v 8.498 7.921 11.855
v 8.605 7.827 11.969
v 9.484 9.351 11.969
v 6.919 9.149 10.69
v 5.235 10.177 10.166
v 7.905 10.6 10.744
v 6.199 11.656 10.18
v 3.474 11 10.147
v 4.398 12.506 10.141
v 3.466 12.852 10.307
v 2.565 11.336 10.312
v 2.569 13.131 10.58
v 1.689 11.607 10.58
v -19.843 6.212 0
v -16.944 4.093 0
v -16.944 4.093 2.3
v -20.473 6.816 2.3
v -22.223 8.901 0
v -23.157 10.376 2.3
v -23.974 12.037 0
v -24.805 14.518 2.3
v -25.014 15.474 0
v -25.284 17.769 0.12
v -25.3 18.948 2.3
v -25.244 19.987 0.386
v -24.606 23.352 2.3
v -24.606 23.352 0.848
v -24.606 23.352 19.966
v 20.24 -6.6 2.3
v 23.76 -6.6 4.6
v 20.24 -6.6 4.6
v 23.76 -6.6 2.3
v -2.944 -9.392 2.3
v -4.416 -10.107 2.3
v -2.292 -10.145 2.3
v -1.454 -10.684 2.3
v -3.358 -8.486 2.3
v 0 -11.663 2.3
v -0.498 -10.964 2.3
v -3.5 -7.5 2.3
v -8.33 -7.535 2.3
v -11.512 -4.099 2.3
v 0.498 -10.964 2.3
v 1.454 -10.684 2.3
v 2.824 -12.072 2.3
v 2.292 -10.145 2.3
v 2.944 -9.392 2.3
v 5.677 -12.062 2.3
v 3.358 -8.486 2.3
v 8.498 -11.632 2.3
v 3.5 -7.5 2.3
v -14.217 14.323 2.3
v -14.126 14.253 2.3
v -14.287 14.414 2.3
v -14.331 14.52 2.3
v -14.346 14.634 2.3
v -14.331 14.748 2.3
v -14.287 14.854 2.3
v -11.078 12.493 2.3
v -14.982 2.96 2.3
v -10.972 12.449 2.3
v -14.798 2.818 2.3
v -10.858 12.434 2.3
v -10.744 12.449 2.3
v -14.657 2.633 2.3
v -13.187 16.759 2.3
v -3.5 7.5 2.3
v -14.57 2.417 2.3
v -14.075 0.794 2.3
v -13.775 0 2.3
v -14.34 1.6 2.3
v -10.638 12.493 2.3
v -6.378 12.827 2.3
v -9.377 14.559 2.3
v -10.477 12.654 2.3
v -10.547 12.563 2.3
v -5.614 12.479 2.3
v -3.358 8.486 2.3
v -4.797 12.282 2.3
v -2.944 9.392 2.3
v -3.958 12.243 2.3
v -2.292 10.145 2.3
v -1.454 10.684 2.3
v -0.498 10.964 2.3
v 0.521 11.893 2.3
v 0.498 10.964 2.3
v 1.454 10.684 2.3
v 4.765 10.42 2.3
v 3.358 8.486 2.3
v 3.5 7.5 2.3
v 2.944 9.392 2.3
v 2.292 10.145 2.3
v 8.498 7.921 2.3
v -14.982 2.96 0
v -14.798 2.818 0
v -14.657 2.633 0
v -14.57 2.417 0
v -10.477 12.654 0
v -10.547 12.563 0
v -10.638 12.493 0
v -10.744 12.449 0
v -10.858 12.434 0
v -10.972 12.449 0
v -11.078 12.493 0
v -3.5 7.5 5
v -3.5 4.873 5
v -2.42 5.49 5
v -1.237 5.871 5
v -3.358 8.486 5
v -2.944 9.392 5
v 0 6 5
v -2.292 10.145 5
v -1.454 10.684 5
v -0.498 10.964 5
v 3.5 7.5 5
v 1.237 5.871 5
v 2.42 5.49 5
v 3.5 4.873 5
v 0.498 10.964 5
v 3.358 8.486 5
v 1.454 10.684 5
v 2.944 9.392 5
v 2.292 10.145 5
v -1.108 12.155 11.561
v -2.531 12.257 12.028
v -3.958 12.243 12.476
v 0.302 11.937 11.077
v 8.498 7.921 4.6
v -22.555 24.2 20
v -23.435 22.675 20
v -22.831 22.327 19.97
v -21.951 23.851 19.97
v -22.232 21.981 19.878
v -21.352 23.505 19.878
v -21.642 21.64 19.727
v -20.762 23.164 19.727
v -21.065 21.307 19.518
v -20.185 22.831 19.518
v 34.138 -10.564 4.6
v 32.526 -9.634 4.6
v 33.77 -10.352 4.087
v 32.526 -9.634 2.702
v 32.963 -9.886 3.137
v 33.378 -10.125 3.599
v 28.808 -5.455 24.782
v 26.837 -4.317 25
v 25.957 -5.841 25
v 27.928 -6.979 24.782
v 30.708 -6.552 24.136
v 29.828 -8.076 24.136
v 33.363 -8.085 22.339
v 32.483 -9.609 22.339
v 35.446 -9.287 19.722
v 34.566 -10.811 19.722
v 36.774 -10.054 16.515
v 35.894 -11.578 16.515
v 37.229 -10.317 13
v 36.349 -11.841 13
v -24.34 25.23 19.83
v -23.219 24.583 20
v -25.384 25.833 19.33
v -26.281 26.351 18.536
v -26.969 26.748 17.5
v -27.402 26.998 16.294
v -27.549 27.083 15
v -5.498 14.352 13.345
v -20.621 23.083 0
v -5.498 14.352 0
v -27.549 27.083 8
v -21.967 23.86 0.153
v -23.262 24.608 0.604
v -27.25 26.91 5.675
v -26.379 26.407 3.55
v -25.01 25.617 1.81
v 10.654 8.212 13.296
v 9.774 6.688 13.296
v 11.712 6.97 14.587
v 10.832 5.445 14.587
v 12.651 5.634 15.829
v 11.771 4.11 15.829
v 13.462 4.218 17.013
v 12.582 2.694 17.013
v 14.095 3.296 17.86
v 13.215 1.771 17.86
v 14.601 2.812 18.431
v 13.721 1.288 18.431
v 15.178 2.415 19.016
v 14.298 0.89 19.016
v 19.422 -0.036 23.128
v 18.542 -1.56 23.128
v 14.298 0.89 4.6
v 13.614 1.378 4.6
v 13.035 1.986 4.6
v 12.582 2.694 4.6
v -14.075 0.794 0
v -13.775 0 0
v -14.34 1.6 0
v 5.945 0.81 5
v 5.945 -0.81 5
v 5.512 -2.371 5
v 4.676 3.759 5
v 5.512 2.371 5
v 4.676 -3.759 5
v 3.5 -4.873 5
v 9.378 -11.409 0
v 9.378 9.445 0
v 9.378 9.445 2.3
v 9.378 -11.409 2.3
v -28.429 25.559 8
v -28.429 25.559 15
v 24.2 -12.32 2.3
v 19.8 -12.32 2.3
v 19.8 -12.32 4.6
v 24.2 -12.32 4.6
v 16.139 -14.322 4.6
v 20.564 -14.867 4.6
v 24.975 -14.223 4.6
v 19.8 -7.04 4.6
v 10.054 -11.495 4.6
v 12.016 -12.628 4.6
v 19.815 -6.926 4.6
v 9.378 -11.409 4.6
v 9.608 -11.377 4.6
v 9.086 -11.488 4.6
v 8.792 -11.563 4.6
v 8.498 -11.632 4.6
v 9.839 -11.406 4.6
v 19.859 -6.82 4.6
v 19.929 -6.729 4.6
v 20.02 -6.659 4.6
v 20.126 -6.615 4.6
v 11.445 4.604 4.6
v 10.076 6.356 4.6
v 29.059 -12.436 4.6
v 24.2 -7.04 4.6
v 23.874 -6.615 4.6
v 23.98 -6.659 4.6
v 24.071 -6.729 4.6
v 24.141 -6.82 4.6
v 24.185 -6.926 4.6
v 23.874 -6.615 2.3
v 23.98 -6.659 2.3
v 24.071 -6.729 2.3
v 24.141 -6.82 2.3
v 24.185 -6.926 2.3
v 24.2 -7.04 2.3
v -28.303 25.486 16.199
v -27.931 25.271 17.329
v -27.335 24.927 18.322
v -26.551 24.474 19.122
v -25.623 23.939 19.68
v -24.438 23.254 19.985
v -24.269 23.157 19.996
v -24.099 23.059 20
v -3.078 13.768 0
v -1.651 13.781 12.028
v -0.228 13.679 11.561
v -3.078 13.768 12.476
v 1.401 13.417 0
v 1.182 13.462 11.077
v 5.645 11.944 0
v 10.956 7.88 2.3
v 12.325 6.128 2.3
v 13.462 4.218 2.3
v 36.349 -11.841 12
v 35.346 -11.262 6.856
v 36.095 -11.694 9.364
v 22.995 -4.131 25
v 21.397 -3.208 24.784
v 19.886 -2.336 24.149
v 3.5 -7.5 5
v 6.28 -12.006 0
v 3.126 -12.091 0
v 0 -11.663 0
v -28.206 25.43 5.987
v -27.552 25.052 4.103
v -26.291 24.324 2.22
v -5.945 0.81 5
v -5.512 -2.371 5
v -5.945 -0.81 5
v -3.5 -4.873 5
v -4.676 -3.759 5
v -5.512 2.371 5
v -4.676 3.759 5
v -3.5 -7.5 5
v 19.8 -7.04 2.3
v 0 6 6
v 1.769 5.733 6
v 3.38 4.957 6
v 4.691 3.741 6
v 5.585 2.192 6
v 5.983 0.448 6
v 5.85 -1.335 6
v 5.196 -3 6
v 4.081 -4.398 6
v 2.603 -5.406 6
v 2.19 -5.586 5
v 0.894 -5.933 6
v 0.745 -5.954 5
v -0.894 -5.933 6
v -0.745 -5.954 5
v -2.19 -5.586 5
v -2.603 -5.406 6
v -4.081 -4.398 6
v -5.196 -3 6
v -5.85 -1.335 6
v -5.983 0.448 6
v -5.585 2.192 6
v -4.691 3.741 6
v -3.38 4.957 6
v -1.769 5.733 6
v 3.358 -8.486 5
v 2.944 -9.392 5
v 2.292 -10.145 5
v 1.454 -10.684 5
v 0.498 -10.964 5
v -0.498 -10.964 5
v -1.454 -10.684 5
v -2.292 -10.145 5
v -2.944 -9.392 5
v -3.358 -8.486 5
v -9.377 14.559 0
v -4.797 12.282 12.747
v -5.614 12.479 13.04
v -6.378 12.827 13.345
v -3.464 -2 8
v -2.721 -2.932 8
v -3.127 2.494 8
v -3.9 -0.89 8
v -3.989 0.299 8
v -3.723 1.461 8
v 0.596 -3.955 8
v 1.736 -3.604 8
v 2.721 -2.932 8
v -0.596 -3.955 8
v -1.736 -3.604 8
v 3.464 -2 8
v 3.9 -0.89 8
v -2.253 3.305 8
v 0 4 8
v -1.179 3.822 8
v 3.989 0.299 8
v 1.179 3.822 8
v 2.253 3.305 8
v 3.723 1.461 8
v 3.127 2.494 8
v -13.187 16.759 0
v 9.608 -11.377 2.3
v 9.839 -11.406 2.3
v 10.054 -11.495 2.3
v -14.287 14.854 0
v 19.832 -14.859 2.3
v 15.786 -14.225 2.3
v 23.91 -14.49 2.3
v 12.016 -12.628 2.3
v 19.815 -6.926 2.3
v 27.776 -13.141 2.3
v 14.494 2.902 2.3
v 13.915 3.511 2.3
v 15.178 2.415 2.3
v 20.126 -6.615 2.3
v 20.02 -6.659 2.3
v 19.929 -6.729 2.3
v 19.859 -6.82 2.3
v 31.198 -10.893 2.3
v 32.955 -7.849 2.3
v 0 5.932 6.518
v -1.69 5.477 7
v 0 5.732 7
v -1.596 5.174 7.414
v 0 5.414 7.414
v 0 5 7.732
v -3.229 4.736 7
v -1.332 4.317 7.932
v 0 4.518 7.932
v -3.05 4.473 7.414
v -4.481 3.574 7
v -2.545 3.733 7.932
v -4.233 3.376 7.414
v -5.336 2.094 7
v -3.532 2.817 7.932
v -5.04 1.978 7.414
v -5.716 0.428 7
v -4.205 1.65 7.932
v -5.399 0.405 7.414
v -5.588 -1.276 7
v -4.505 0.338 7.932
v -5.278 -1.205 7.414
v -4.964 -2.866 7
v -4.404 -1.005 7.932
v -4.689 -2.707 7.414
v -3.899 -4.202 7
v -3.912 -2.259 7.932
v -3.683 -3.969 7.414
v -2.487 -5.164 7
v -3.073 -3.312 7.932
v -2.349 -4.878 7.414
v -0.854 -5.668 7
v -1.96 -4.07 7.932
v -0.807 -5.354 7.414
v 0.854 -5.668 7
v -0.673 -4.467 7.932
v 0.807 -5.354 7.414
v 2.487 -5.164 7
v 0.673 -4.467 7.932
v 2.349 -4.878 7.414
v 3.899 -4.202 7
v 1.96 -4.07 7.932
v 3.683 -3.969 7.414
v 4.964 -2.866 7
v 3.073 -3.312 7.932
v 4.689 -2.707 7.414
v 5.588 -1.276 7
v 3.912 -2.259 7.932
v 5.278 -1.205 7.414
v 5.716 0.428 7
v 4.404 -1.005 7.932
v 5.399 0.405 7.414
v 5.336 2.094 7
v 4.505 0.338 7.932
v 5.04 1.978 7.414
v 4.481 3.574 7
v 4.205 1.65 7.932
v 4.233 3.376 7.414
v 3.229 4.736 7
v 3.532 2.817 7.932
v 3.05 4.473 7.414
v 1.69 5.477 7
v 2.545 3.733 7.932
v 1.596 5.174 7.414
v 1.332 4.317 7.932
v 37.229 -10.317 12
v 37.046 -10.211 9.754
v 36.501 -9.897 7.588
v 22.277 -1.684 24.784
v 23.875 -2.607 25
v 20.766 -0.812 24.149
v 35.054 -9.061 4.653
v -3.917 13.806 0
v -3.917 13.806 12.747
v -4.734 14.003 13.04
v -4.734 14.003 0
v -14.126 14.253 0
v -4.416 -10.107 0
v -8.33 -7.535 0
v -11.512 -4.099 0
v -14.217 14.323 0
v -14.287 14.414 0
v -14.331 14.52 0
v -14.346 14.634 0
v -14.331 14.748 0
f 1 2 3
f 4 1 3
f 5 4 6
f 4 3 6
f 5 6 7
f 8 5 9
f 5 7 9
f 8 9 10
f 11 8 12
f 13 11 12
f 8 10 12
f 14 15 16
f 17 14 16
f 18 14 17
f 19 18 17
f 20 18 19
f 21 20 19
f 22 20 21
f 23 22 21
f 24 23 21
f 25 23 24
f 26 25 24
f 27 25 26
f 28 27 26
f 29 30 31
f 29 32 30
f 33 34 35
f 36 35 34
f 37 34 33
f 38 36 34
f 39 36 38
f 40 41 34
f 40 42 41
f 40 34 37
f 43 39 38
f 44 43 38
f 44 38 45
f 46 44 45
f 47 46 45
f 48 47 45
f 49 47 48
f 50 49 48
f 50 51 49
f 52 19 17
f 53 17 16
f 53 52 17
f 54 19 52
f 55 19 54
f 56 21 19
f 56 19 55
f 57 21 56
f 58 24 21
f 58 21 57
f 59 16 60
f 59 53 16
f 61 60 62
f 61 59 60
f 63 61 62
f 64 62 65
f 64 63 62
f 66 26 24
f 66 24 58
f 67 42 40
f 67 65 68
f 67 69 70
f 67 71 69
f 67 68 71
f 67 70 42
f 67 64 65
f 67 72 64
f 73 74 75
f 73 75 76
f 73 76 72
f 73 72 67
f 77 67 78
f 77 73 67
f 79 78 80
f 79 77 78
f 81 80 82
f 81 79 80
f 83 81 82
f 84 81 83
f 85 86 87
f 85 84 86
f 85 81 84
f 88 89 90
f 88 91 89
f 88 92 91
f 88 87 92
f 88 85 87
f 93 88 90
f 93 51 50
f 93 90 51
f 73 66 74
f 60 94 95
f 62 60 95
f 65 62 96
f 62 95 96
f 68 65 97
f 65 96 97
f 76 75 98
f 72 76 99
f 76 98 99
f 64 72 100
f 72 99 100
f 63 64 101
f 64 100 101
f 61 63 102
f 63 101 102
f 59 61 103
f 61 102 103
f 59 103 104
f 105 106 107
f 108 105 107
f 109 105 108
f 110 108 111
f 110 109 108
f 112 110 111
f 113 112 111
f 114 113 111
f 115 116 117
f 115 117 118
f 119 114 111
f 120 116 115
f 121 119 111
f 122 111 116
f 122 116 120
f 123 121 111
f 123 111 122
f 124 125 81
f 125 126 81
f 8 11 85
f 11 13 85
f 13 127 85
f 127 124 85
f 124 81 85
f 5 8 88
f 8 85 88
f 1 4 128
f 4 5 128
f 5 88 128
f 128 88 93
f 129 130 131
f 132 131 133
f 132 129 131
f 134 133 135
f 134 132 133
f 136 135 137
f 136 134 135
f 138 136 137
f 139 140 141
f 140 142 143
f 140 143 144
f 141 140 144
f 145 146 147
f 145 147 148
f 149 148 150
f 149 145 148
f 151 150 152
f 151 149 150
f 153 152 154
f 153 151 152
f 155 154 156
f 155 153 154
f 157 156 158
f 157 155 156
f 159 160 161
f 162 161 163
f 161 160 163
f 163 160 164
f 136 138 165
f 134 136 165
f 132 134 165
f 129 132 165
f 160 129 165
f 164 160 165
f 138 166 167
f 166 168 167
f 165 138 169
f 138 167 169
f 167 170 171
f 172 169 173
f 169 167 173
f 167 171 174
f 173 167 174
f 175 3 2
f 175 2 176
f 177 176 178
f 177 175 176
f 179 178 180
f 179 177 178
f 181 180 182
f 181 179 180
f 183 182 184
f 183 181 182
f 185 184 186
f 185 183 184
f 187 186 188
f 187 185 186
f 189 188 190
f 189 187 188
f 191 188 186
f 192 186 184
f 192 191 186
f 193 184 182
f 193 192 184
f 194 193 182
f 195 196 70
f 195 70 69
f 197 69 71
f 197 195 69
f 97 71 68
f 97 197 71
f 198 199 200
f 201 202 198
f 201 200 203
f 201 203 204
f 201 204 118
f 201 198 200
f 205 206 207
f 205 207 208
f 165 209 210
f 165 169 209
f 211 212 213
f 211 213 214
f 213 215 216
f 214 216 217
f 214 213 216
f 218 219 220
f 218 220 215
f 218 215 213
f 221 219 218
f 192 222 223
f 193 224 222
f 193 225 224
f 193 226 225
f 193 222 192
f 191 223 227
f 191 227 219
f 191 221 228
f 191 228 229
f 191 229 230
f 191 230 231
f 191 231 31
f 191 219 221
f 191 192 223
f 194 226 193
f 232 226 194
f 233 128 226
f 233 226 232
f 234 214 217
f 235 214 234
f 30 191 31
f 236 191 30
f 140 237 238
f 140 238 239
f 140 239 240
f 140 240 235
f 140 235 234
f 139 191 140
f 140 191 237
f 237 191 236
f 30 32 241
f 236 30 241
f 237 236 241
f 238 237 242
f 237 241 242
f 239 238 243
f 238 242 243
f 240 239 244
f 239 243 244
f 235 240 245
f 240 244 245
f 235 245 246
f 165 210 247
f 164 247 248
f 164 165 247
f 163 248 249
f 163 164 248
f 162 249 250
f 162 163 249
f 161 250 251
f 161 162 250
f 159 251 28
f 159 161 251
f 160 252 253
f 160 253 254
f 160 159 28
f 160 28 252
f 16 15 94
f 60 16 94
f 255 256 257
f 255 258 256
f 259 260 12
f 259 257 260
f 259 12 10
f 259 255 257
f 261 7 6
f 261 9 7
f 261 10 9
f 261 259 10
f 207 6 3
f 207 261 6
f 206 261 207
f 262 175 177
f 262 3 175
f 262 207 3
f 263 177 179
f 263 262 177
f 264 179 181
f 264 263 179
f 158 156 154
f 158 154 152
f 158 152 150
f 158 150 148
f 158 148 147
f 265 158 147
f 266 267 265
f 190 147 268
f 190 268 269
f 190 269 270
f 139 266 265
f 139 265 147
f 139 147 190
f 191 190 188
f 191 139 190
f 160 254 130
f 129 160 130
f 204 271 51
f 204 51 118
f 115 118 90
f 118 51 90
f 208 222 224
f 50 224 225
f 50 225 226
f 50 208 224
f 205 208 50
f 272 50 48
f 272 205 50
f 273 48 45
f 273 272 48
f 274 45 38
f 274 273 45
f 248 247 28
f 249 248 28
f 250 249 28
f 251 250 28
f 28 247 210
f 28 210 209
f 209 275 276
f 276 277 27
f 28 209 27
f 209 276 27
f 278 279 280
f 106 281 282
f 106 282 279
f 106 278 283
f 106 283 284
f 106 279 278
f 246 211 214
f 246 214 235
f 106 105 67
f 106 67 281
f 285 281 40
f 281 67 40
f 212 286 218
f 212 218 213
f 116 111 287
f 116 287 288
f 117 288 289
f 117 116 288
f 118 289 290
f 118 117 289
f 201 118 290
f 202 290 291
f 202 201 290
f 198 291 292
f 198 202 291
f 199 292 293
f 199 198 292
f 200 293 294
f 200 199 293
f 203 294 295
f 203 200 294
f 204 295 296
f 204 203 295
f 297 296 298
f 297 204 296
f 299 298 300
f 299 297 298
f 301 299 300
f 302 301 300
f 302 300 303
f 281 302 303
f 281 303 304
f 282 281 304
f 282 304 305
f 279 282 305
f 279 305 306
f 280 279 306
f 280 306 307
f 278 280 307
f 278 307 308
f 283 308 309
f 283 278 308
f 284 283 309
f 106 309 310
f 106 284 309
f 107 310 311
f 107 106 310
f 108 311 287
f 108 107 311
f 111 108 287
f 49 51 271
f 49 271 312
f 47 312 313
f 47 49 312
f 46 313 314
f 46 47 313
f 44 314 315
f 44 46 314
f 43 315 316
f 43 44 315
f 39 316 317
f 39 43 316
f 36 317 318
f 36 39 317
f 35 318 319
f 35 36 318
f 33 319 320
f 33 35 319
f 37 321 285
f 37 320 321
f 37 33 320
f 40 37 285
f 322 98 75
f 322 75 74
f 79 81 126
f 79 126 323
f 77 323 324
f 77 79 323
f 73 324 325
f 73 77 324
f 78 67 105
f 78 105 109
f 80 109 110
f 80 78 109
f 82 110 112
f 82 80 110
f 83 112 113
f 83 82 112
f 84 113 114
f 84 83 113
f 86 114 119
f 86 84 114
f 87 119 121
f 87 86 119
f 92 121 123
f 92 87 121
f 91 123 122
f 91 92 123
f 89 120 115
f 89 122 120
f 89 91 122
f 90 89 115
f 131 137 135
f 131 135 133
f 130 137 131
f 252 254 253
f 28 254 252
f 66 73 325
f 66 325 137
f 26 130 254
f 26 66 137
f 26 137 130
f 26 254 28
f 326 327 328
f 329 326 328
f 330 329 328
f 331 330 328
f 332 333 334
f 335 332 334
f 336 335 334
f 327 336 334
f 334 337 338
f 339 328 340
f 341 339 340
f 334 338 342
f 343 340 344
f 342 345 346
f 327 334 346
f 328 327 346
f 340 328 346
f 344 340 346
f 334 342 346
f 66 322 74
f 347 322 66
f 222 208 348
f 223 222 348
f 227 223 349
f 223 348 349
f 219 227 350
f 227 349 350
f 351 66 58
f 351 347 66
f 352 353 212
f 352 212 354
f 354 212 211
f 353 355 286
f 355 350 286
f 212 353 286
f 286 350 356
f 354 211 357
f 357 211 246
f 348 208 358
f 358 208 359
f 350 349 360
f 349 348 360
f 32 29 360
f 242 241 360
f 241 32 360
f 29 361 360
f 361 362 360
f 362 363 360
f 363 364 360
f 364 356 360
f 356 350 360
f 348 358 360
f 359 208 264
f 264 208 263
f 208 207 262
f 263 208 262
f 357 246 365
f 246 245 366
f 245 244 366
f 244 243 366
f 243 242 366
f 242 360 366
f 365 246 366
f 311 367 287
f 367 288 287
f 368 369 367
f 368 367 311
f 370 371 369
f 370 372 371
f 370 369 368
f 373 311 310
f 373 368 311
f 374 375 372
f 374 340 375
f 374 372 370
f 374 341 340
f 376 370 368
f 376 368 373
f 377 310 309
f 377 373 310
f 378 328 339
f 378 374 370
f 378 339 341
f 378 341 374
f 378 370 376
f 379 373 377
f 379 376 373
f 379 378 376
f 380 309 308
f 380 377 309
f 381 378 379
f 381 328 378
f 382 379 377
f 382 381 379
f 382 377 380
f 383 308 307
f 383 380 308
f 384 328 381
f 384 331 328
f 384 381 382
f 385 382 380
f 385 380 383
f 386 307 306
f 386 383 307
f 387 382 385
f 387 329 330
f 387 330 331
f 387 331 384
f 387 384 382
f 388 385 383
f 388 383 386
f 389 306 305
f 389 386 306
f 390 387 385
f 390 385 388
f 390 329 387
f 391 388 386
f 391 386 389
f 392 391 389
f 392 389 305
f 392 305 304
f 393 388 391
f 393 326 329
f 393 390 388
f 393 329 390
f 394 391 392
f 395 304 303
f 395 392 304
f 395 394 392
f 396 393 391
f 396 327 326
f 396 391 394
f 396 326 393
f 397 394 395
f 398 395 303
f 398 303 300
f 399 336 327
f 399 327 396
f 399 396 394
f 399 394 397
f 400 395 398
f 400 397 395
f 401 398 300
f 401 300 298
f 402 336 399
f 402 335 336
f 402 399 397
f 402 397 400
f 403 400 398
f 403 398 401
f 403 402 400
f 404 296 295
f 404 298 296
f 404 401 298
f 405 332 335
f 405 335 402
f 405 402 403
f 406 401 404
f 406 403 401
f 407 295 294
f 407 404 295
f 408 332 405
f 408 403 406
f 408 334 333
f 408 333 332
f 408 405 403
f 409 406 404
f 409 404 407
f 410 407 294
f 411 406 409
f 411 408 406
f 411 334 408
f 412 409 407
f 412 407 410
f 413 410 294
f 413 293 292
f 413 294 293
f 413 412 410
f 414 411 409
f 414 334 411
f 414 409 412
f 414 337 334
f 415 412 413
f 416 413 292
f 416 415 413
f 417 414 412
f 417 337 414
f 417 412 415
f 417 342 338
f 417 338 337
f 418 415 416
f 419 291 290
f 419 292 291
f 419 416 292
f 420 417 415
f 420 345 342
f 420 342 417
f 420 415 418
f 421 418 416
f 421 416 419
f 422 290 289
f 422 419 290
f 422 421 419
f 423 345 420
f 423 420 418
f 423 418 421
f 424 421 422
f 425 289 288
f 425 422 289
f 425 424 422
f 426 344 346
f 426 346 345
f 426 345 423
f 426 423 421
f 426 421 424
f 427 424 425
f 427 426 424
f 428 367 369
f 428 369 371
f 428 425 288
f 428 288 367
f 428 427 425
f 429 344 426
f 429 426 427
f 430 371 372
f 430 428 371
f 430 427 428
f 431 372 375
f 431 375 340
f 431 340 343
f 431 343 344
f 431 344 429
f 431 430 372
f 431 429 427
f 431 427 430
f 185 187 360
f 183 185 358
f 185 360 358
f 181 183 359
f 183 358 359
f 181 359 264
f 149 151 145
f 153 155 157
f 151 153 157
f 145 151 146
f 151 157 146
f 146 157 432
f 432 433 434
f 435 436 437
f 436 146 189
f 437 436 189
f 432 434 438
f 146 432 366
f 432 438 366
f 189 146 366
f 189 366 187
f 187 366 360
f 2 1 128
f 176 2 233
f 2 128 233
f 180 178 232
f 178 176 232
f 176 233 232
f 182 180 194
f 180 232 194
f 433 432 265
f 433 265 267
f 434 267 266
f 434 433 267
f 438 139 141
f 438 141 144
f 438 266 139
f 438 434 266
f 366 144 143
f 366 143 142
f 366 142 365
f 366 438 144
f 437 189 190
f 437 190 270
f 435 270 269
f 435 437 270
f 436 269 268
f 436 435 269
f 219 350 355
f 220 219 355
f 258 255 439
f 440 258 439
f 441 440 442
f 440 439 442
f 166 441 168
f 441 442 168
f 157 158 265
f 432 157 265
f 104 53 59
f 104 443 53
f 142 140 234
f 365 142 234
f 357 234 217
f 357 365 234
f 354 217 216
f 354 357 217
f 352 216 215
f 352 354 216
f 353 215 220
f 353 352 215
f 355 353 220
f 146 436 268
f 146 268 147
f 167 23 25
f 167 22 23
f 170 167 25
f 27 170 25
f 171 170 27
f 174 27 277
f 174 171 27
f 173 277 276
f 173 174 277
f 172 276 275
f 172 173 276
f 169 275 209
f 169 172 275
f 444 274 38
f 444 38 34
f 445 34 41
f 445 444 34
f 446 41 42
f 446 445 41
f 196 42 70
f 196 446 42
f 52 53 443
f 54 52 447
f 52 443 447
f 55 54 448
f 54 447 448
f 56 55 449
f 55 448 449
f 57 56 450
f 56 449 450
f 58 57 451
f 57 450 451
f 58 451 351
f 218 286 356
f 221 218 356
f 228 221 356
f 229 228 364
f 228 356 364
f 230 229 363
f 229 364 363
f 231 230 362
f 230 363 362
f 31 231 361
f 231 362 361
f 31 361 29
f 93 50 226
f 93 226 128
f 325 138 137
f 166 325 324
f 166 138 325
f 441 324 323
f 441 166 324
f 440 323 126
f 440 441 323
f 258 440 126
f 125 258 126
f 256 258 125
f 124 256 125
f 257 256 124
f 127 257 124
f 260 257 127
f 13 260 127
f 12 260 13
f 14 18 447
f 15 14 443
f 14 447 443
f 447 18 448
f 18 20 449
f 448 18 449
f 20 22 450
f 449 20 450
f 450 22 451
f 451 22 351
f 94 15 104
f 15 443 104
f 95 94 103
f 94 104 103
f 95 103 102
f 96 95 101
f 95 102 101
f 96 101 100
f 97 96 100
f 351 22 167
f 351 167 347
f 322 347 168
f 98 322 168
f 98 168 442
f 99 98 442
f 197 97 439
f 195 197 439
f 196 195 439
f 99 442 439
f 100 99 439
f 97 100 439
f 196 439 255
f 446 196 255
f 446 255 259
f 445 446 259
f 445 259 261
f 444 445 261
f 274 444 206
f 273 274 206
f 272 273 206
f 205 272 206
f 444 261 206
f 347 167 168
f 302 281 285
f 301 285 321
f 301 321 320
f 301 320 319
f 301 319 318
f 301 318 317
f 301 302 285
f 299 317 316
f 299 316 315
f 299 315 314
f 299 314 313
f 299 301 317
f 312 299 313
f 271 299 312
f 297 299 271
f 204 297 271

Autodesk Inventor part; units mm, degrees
sketch "Sketch_1" plane through (0, 0, 0) normal (0, 0, 1) x (1, 0, 0)
  line L0 (-28.4294, 25.5589) -> (-24.6062, 23.3516)
  arc A0 (-24.6062, 23.3516) -> (-16.9438, 4.0925) centre (-8.5838, 18.5724) ccw
  line L1 (-16.9438, 4.0925) -> (-14.9819, 2.9597)
  arc A1 (-14.5696, 2.4169) -> (-14.9819, 2.9597) centre (-15.4219, 2.1976) ccw
  arc A2 (-14.5696, 2.4169) -> (-13.7753, 0) centre (4.18, 7.24) ccw
  arc A3 (-13.7753, 0) -> (0, -11.6634) centre (4.18, 7.24) ccw
  arc A4 (0, -11.6634) -> (9.3779, -11.4092) centre (4.18, 7.24) ccw
  arc A5 (10.0541, -11.4948) -> (9.3779, -11.4092) centre (9.6141, -12.2569) ccw
  line L2 (10.0541, -11.4948) -> (12.0161, -12.6275)
  arc A6 (12.0161, -12.6275) -> (32.5262, -9.6338) centre (20.3761, 1.8524) ccw
  line L3 (32.5262, -9.6338) -> (36.3494, -11.8411)
  line L4 (36.3494, -11.8411) -> (37.2294, -10.3169)
  line L5 (37.2294, -10.3169) -> (15.1777, 2.4147)
  arc A7 (13.4621, 4.218) -> (15.1777, 2.4147) centre (17.3777, 6.2252) ccw
  arc A8 (13.4621, 4.218) -> (-3.0781, 13.7676) centre (-2.2, -3.8105) ccw
  arc A9 (-5.4977, 14.3516) -> (-3.0781, 13.7676) centre (-3.2977, 18.1621) ccw
  line L6 (-5.4977, 14.3516) -> (-27.5494, 27.0831)
  line L7 (-27.5494, 27.0831) -> (-28.4294, 25.5589)
  line L8 (19.8, -12.32) -> (24.2, -12.32)
  line L9 (24.2, -12.32) -> (24.2, -7.04)
  arc A10 (24.2, -7.04) -> (23.76, -6.6) centre (23.76, -7.04) ccw
  line L10 (23.76, -6.6) -> (20.24, -6.6)
  arc A11 (20.24, -6.6) -> (19.8, -7.04) centre (20.24, -7.04) ccw
  line L11 (19.8, -7.04) -> (19.8, -12.32)
  arc A12 (-14.2873, 14.8537) -> (-14.1263, 14.2526) centre (-13.9063, 14.6337) ccw
  line L12 (-14.1263, 14.2526) -> (-11.0778, 12.4926)
  arc A13 (-11.0778, 12.4926) -> (-10.4768, 12.6537) centre (-10.8578, 12.8737) ccw
  line L13 (-10.4768, 12.6537) -> (-9.3768, 14.5589)
  line L14 (-9.3768, 14.5589) -> (-13.1873, 16.7589)
  line L15 (-13.1873, 16.7589) -> (-14.2873, 14.8537)
extrude "Extrusion1" add sketch "Sketch_1" along normal blind 25
sketch "Sketch_2" plane through (0, 0, 2.3) normal (0, 0, 1) x (1, 0, 0)
  line L0 (-29.3094, 24.0347) -> (-25.4862, 21.8274)
  arc A0 (-25.4862, 21.8274) -> (-17.8238, 2.5683) centre (-9.4638, 17.0482) ccw
  line L1 (-17.8238, 2.5683) -> (-15.8619, 1.4355)
  arc A1 (-15.4496, 0.8927) -> (-15.8619, 1.4355) centre (-16.3019, 0.6734) ccw
  arc A2 (-15.4496, 0.8927) -> (-14.6553, -1.5242) centre (3.3, 5.7158) ccw
  arc A3 (-14.6553, -1.5242) -> (-0.88, -13.1876) centre (3.3, 5.7158) ccw
  arc A4 (-0.88, -13.1876) -> (8.4979, -12.9334) centre (3.3, 5.7158) ccw
  line L2 (8.4979, -12.9334) -> (8.4979, 7.921)
  arc A5 (8.4979, 7.921) -> (-3.9581, 12.2434) centre (-3.08, -5.3347) ccw
  arc A6 (-6.3777, 12.8274) -> (-3.9581, 12.2434) centre (-4.1777, 16.6379) ccw
  line L3 (-6.3777, 12.8274) -> (-28.4294, 25.5589)
  line L4 (-28.4294, 25.5589) -> (-29.3094, 24.0347)
extrude "Extrusion2" cut sketch "Sketch_2" along normal blind 50
sketch "Sketch_8" plane through (0, 0, 4.6) normal (0, 0, 1) x (1, 0, 0)
  line L0 (8.4979, 7.921) -> (8.4979, -12.9334)
  arc A0 (9.1741, -13.019) -> (8.4979, -12.9334) centre (8.7341, -13.7811) ccw
  line L1 (9.1741, -13.019) -> (11.1361, -14.1517)
  arc A1 (11.1361, -14.1517) -> (31.6462, -11.158) centre (19.4961, 0.3282) ccw
  line L2 (31.6462, -11.158) -> (35.4694, -13.3653)
  line L3 (35.4694, -13.3653) -> (36.3494, -11.8411)
  line L4 (36.3494, -11.8411) -> (14.2977, 0.8905)
  arc A2 (12.5821, 2.6938) -> (14.2977, 0.8905) centre (16.4977, 4.701) ccw
  arc A3 (12.5821, 2.6938) -> (8.4979, 7.921) centre (-3.08, -5.3347) ccw
extrude "Extrusion3" cut sketch "Sketch_8" along normal blind 50
sketch "Sketch_9" plane through (0, 0, 0) normal (0, 0, 1) x (1, 0, 0)
  line L0 (9.3779, 11.6892) -> (9.3779, -11.4092)
  arc A0 (10.0541, -11.4948) -> (9.3779, -11.4092) centre (9.6141, -12.2569) ccw
  line L1 (10.0541, -11.4948) -> (12.0161, -12.6275)
  arc A1 (12.0161, -12.6275) -> (32.5262, -9.6338) centre (20.3761, 1.8524) ccw
  line L2 (32.5262, -9.6338) -> (36.3494, -11.8411)
  line L3 (36.3494, -11.8411) -> (38.1094, -8.7927)
  line L4 (38.1094, -8.7927) -> (16.0577, 3.9389)
  arc A2 (14.3421, 5.7423) -> (16.0577, 3.9389) centre (18.2577, 7.7494) ccw
  arc A3 (14.3421, 5.7423) -> (9.3779, 11.6892) centre (-1.32, -2.2863) ccw
  line L5 (19.8, -12.32) -> (24.2, -12.32)
  line L6 (24.2, -12.32) -> (24.2, -7.04)
  arc A4 (24.2, -7.04) -> (23.76, -6.6) centre (23.76, -7.04) ccw
  line L7 (23.76, -6.6) -> (20.24, -6.6)
  arc A5 (20.24, -6.6) -> (19.8, -7.04) centre (20.24, -7.04) ccw
  line L8 (19.8, -7.04) -> (19.8, -12.32)
extrude "Extrusion4" cut sketch "Sketch_9" along normal blind 2.3
sketch "Sketch_3" plane through (0, 0, 0) normal (0.5, 0.866, 0) x (0.866, -0.5, 0)
  line L0 (-80, -90) -> (80, -90)
  line L1 (80, -90) -> (80, 10)
  line L2 (80, 10) -> (-80, 10)
  line L3 (-80, 10) -> (-80, -90)
  line L4 (-37.4, -8) -> (-37.4, -15)
  arc A0 (-37.4, -15) -> (-32.4, -20) centre (-32.4, -15) ccw
  line L5 (-32.4, -20) -> (-31.6329, -20)
  arc A1 (-31.6329, -20) -> (-28.8967, -19.5175) centre (-31.6329, -12) ccw
  line L6 (-28.8967, -19.5175) -> (-4.3403, -10.5797)
  arc A2 (3.5382, -11.9689) -> (-4.3403, -10.5797) centre (-1.6041, -18.0973) ccw
  line L7 (3.5382, -11.9689) -> (16.8375, -23.1284)
  arc A3 (16.8375, -23.1284) -> (21.9798, -25) centre (21.9798, -17) ccw
  line L8 (21.9798, -25) -> (25.4, -25)
  arc A4 (25.4, -25) -> (37.4, -13) centre (25.4, -13) ccw
  line L9 (37.4, -13) -> (37.4, -12)
  arc A5 (37.4, -12) -> (25.4, 0) centre (25.4, -12) ccw
  line L10 (25.4, 0) -> (-29.4, 0)
  arc A6 (-29.4, 0) -> (-37.4, -8) centre (-29.4, -8) ccw
extrude "Extrusion5" cut sketch "Sketch_3" along normal mid plane 100
sketch "Sketch_7" plane through (0, 0, 0) normal (1, 0, 0) x (0, 1, 0)
  line L0 (0, 0) -> (0, 8)
  line L1 (0, 8) -> (4, 8)
  arc A0 (6, 6) -> (4, 8) centre (4, 6) ccw
  line L2 (6, 6) -> (6, 5)
  line L3 (6, 5) -> (0, 5)
  line L4 (0, 5) -> (0, 8)
sketch "Sketch_4" plane through (0, 0, 2.3) normal (0, 0, 1) x (1, 0, 0)
  arc A0 (-3.5, -7.5) -> (3.5, -7.5) centre (0, -7.5) ccw
  line L0 (3.5, -7.5) -> (3.5, 7.5)
  arc A1 (3.5, 7.5) -> (-3.5, 7.5) centre (0, 7.5) ccw
  line L1 (-3.5, 7.5) -> (-3.5, -7.5)
extrude "Extrusion6" add sketch "Sketch_4" along normal blind 2.7
revolve "Revolution1" add sketch "Sketch_7" angle 360 about axis through (0, 0, 0) along (0, 0, -1)
ref_plane "stopper_to_body_XY" through (0, 0, 0) normal (0, 0, 1) x (1, 0, 0)
ref_plane "stopper_to_body_YZ" through (0, 0, 0) normal (1, 0, 0) x (0, 1, 0)
ref_plane "stopper_to_body_ZX" through (0, 0, 0) normal (0, 1, 0) x (0, 0, 1)
properties part number "STOPPER-HSMCS50"
